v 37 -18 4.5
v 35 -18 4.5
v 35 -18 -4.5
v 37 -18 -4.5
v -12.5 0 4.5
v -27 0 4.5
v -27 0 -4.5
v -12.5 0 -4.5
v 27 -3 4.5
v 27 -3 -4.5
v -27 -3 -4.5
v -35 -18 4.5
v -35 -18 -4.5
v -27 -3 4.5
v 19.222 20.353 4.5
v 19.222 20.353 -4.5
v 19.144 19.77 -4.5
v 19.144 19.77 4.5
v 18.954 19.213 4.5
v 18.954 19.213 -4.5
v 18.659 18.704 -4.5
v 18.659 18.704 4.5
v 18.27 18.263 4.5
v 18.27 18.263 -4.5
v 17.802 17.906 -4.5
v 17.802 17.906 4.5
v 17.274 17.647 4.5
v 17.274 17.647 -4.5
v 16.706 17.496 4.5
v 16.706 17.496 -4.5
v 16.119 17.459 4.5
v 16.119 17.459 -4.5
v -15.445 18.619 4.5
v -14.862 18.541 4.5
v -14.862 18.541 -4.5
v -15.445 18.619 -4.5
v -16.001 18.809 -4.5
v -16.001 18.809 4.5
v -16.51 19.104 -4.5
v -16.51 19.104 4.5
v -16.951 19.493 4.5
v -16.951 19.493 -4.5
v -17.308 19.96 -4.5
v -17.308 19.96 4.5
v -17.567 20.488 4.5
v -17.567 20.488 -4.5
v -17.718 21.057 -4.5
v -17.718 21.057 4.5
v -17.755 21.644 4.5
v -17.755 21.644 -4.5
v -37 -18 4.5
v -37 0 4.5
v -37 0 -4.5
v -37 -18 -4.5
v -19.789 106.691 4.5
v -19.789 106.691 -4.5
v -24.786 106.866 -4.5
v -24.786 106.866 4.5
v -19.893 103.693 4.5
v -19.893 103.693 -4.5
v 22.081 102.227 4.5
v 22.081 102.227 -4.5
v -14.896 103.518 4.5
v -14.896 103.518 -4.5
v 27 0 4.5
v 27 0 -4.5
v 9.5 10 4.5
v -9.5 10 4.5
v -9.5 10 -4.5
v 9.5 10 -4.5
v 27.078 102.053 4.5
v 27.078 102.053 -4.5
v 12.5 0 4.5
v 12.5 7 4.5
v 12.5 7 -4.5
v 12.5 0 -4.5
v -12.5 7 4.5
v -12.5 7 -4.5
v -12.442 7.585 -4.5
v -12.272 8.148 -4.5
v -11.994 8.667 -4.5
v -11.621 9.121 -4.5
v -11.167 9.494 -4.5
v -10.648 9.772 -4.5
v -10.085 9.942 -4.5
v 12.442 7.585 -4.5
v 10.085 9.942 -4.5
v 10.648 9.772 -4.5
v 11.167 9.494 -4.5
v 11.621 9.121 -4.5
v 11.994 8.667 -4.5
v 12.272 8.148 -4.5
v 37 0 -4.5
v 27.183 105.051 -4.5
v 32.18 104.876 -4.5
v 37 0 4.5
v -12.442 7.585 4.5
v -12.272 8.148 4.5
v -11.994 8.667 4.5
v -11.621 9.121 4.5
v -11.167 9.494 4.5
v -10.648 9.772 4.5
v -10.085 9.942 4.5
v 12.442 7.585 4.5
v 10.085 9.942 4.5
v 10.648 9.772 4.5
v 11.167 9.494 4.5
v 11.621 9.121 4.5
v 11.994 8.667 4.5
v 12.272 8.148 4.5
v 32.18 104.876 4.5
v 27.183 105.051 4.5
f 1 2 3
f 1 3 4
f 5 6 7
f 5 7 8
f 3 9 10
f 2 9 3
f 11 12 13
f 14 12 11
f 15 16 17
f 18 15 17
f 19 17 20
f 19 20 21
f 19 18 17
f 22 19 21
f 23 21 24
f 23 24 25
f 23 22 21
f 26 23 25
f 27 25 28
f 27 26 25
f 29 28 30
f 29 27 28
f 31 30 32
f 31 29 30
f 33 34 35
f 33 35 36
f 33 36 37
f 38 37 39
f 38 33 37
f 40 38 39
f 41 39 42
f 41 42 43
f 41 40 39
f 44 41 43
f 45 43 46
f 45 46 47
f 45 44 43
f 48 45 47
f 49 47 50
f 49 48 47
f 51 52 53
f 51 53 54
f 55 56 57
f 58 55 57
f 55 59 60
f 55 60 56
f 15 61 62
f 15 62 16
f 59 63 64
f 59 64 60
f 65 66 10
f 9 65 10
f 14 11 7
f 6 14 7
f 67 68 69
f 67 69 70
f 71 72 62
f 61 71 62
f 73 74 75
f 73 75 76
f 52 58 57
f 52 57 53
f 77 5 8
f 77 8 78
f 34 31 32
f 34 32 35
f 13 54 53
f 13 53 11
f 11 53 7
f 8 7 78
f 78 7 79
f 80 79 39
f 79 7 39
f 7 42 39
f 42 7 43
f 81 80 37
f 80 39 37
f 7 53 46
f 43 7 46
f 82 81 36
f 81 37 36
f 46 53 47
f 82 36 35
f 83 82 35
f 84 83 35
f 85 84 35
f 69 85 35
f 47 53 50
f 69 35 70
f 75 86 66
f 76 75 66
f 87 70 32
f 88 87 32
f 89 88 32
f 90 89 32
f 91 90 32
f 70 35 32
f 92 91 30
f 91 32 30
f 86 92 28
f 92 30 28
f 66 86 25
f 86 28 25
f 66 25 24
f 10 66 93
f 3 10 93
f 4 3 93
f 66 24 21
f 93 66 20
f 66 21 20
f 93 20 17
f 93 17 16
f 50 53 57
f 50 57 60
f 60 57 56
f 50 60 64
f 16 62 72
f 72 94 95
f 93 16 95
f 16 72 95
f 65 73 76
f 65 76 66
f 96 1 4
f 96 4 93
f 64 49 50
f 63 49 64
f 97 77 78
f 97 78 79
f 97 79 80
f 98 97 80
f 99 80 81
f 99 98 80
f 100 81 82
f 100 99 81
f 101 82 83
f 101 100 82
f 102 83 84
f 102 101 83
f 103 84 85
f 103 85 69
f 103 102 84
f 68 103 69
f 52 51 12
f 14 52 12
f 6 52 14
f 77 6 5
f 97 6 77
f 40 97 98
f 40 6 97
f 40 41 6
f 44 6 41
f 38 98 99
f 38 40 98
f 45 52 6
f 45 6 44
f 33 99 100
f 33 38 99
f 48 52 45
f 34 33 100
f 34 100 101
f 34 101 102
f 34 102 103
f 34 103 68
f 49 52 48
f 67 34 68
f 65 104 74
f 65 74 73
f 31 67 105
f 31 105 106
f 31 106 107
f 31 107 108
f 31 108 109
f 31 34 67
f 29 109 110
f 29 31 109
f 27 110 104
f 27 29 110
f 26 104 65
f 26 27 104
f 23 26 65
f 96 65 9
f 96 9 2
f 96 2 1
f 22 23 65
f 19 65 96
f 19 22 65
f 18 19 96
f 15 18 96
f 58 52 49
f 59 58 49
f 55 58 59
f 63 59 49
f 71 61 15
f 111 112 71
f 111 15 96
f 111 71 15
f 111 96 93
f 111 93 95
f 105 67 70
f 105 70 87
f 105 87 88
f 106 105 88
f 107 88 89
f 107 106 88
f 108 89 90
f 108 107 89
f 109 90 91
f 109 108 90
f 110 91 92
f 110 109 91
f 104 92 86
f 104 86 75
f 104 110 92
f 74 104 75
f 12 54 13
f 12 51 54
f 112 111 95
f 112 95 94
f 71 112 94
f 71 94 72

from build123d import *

# Parameters (mm, degrees)
F1_DEPTH = 4.5


with BuildPart() as f1:
    # F0 (on Top) → F1 (new body, symmetric)
    with BuildSketch(Plane.XY):
        with BuildLine():
            Line((-27, -3), (-27, 0))
            Line((-27, 0), (-12.5, 0))
            Line((-12.5, 0), (-12.5, 7))
            ThreePointArc((-12.5, 7), (-11.6213203436, 9.1213203436), (-9.5, 10))
            Line((-9.5, 10), (9.5, 10))
            ThreePointArc((9.5, 10), (11.6213203436, 9.1213203436), (12.5, 7))
            Line((12.5, 7), (12.5, 0))
            Line((12.5, 0), (27, 0))
            Line((27, 0), (27, -3))
            Line((27, -3), (35, -18))
            Line((35, -18), (37, -18))
            Line((37, -18), (37, 0))
            Line((37, 0), (32.1797316785, 104.8762590077))
            Line((32.1797316785, 104.8762590077), (27.1827775434, 105.0507564913))
            Line((27.1827775434, 105.0507564913), (27.0780790533, 102.0525840102))
            Line((27.0780790533, 102.0525840102), (22.0811249182, 102.2270814937))
            Line((22.0811249182, 102.2270814937), (19.2220026408, 20.3525317921))
            ThreePointArc((19.2220026408, 20.3525317921), (18.2698252399, 18.2631691773), (16.1191316696, 17.4590578011))
            Line((16.1191316696, 17.4590578011), (-14.8619839679, 18.5409421989))
            ThreePointArc((-14.8619839679, 18.5409421989), (-16.9513465827, 19.4931195998), (-17.7554579589, 21.6438131701))
            Line((-17.7554579589, 21.6438131701), (-14.8963356815, 103.5183628717))
            Line((-14.8963356815, 103.5183628717), (-19.8932898166, 103.6928603552))
            Line((-19.8932898166, 103.6928603552), (-19.7885913265, 106.6910328363))
            Line((-19.7885913265, 106.6910328363), (-24.7855454616, 106.8655303198))
            Line((-24.7855454616, 106.8655303198), (-37, 0))
            Line((-37, 0), (-37, -18))
            Line((-37, -18), (-35, -18))
            Line((-35, -18), (-27, -3))
        make_face()
    extrude(amount=F1_DEPTH, both=True)


solid = f1.part
